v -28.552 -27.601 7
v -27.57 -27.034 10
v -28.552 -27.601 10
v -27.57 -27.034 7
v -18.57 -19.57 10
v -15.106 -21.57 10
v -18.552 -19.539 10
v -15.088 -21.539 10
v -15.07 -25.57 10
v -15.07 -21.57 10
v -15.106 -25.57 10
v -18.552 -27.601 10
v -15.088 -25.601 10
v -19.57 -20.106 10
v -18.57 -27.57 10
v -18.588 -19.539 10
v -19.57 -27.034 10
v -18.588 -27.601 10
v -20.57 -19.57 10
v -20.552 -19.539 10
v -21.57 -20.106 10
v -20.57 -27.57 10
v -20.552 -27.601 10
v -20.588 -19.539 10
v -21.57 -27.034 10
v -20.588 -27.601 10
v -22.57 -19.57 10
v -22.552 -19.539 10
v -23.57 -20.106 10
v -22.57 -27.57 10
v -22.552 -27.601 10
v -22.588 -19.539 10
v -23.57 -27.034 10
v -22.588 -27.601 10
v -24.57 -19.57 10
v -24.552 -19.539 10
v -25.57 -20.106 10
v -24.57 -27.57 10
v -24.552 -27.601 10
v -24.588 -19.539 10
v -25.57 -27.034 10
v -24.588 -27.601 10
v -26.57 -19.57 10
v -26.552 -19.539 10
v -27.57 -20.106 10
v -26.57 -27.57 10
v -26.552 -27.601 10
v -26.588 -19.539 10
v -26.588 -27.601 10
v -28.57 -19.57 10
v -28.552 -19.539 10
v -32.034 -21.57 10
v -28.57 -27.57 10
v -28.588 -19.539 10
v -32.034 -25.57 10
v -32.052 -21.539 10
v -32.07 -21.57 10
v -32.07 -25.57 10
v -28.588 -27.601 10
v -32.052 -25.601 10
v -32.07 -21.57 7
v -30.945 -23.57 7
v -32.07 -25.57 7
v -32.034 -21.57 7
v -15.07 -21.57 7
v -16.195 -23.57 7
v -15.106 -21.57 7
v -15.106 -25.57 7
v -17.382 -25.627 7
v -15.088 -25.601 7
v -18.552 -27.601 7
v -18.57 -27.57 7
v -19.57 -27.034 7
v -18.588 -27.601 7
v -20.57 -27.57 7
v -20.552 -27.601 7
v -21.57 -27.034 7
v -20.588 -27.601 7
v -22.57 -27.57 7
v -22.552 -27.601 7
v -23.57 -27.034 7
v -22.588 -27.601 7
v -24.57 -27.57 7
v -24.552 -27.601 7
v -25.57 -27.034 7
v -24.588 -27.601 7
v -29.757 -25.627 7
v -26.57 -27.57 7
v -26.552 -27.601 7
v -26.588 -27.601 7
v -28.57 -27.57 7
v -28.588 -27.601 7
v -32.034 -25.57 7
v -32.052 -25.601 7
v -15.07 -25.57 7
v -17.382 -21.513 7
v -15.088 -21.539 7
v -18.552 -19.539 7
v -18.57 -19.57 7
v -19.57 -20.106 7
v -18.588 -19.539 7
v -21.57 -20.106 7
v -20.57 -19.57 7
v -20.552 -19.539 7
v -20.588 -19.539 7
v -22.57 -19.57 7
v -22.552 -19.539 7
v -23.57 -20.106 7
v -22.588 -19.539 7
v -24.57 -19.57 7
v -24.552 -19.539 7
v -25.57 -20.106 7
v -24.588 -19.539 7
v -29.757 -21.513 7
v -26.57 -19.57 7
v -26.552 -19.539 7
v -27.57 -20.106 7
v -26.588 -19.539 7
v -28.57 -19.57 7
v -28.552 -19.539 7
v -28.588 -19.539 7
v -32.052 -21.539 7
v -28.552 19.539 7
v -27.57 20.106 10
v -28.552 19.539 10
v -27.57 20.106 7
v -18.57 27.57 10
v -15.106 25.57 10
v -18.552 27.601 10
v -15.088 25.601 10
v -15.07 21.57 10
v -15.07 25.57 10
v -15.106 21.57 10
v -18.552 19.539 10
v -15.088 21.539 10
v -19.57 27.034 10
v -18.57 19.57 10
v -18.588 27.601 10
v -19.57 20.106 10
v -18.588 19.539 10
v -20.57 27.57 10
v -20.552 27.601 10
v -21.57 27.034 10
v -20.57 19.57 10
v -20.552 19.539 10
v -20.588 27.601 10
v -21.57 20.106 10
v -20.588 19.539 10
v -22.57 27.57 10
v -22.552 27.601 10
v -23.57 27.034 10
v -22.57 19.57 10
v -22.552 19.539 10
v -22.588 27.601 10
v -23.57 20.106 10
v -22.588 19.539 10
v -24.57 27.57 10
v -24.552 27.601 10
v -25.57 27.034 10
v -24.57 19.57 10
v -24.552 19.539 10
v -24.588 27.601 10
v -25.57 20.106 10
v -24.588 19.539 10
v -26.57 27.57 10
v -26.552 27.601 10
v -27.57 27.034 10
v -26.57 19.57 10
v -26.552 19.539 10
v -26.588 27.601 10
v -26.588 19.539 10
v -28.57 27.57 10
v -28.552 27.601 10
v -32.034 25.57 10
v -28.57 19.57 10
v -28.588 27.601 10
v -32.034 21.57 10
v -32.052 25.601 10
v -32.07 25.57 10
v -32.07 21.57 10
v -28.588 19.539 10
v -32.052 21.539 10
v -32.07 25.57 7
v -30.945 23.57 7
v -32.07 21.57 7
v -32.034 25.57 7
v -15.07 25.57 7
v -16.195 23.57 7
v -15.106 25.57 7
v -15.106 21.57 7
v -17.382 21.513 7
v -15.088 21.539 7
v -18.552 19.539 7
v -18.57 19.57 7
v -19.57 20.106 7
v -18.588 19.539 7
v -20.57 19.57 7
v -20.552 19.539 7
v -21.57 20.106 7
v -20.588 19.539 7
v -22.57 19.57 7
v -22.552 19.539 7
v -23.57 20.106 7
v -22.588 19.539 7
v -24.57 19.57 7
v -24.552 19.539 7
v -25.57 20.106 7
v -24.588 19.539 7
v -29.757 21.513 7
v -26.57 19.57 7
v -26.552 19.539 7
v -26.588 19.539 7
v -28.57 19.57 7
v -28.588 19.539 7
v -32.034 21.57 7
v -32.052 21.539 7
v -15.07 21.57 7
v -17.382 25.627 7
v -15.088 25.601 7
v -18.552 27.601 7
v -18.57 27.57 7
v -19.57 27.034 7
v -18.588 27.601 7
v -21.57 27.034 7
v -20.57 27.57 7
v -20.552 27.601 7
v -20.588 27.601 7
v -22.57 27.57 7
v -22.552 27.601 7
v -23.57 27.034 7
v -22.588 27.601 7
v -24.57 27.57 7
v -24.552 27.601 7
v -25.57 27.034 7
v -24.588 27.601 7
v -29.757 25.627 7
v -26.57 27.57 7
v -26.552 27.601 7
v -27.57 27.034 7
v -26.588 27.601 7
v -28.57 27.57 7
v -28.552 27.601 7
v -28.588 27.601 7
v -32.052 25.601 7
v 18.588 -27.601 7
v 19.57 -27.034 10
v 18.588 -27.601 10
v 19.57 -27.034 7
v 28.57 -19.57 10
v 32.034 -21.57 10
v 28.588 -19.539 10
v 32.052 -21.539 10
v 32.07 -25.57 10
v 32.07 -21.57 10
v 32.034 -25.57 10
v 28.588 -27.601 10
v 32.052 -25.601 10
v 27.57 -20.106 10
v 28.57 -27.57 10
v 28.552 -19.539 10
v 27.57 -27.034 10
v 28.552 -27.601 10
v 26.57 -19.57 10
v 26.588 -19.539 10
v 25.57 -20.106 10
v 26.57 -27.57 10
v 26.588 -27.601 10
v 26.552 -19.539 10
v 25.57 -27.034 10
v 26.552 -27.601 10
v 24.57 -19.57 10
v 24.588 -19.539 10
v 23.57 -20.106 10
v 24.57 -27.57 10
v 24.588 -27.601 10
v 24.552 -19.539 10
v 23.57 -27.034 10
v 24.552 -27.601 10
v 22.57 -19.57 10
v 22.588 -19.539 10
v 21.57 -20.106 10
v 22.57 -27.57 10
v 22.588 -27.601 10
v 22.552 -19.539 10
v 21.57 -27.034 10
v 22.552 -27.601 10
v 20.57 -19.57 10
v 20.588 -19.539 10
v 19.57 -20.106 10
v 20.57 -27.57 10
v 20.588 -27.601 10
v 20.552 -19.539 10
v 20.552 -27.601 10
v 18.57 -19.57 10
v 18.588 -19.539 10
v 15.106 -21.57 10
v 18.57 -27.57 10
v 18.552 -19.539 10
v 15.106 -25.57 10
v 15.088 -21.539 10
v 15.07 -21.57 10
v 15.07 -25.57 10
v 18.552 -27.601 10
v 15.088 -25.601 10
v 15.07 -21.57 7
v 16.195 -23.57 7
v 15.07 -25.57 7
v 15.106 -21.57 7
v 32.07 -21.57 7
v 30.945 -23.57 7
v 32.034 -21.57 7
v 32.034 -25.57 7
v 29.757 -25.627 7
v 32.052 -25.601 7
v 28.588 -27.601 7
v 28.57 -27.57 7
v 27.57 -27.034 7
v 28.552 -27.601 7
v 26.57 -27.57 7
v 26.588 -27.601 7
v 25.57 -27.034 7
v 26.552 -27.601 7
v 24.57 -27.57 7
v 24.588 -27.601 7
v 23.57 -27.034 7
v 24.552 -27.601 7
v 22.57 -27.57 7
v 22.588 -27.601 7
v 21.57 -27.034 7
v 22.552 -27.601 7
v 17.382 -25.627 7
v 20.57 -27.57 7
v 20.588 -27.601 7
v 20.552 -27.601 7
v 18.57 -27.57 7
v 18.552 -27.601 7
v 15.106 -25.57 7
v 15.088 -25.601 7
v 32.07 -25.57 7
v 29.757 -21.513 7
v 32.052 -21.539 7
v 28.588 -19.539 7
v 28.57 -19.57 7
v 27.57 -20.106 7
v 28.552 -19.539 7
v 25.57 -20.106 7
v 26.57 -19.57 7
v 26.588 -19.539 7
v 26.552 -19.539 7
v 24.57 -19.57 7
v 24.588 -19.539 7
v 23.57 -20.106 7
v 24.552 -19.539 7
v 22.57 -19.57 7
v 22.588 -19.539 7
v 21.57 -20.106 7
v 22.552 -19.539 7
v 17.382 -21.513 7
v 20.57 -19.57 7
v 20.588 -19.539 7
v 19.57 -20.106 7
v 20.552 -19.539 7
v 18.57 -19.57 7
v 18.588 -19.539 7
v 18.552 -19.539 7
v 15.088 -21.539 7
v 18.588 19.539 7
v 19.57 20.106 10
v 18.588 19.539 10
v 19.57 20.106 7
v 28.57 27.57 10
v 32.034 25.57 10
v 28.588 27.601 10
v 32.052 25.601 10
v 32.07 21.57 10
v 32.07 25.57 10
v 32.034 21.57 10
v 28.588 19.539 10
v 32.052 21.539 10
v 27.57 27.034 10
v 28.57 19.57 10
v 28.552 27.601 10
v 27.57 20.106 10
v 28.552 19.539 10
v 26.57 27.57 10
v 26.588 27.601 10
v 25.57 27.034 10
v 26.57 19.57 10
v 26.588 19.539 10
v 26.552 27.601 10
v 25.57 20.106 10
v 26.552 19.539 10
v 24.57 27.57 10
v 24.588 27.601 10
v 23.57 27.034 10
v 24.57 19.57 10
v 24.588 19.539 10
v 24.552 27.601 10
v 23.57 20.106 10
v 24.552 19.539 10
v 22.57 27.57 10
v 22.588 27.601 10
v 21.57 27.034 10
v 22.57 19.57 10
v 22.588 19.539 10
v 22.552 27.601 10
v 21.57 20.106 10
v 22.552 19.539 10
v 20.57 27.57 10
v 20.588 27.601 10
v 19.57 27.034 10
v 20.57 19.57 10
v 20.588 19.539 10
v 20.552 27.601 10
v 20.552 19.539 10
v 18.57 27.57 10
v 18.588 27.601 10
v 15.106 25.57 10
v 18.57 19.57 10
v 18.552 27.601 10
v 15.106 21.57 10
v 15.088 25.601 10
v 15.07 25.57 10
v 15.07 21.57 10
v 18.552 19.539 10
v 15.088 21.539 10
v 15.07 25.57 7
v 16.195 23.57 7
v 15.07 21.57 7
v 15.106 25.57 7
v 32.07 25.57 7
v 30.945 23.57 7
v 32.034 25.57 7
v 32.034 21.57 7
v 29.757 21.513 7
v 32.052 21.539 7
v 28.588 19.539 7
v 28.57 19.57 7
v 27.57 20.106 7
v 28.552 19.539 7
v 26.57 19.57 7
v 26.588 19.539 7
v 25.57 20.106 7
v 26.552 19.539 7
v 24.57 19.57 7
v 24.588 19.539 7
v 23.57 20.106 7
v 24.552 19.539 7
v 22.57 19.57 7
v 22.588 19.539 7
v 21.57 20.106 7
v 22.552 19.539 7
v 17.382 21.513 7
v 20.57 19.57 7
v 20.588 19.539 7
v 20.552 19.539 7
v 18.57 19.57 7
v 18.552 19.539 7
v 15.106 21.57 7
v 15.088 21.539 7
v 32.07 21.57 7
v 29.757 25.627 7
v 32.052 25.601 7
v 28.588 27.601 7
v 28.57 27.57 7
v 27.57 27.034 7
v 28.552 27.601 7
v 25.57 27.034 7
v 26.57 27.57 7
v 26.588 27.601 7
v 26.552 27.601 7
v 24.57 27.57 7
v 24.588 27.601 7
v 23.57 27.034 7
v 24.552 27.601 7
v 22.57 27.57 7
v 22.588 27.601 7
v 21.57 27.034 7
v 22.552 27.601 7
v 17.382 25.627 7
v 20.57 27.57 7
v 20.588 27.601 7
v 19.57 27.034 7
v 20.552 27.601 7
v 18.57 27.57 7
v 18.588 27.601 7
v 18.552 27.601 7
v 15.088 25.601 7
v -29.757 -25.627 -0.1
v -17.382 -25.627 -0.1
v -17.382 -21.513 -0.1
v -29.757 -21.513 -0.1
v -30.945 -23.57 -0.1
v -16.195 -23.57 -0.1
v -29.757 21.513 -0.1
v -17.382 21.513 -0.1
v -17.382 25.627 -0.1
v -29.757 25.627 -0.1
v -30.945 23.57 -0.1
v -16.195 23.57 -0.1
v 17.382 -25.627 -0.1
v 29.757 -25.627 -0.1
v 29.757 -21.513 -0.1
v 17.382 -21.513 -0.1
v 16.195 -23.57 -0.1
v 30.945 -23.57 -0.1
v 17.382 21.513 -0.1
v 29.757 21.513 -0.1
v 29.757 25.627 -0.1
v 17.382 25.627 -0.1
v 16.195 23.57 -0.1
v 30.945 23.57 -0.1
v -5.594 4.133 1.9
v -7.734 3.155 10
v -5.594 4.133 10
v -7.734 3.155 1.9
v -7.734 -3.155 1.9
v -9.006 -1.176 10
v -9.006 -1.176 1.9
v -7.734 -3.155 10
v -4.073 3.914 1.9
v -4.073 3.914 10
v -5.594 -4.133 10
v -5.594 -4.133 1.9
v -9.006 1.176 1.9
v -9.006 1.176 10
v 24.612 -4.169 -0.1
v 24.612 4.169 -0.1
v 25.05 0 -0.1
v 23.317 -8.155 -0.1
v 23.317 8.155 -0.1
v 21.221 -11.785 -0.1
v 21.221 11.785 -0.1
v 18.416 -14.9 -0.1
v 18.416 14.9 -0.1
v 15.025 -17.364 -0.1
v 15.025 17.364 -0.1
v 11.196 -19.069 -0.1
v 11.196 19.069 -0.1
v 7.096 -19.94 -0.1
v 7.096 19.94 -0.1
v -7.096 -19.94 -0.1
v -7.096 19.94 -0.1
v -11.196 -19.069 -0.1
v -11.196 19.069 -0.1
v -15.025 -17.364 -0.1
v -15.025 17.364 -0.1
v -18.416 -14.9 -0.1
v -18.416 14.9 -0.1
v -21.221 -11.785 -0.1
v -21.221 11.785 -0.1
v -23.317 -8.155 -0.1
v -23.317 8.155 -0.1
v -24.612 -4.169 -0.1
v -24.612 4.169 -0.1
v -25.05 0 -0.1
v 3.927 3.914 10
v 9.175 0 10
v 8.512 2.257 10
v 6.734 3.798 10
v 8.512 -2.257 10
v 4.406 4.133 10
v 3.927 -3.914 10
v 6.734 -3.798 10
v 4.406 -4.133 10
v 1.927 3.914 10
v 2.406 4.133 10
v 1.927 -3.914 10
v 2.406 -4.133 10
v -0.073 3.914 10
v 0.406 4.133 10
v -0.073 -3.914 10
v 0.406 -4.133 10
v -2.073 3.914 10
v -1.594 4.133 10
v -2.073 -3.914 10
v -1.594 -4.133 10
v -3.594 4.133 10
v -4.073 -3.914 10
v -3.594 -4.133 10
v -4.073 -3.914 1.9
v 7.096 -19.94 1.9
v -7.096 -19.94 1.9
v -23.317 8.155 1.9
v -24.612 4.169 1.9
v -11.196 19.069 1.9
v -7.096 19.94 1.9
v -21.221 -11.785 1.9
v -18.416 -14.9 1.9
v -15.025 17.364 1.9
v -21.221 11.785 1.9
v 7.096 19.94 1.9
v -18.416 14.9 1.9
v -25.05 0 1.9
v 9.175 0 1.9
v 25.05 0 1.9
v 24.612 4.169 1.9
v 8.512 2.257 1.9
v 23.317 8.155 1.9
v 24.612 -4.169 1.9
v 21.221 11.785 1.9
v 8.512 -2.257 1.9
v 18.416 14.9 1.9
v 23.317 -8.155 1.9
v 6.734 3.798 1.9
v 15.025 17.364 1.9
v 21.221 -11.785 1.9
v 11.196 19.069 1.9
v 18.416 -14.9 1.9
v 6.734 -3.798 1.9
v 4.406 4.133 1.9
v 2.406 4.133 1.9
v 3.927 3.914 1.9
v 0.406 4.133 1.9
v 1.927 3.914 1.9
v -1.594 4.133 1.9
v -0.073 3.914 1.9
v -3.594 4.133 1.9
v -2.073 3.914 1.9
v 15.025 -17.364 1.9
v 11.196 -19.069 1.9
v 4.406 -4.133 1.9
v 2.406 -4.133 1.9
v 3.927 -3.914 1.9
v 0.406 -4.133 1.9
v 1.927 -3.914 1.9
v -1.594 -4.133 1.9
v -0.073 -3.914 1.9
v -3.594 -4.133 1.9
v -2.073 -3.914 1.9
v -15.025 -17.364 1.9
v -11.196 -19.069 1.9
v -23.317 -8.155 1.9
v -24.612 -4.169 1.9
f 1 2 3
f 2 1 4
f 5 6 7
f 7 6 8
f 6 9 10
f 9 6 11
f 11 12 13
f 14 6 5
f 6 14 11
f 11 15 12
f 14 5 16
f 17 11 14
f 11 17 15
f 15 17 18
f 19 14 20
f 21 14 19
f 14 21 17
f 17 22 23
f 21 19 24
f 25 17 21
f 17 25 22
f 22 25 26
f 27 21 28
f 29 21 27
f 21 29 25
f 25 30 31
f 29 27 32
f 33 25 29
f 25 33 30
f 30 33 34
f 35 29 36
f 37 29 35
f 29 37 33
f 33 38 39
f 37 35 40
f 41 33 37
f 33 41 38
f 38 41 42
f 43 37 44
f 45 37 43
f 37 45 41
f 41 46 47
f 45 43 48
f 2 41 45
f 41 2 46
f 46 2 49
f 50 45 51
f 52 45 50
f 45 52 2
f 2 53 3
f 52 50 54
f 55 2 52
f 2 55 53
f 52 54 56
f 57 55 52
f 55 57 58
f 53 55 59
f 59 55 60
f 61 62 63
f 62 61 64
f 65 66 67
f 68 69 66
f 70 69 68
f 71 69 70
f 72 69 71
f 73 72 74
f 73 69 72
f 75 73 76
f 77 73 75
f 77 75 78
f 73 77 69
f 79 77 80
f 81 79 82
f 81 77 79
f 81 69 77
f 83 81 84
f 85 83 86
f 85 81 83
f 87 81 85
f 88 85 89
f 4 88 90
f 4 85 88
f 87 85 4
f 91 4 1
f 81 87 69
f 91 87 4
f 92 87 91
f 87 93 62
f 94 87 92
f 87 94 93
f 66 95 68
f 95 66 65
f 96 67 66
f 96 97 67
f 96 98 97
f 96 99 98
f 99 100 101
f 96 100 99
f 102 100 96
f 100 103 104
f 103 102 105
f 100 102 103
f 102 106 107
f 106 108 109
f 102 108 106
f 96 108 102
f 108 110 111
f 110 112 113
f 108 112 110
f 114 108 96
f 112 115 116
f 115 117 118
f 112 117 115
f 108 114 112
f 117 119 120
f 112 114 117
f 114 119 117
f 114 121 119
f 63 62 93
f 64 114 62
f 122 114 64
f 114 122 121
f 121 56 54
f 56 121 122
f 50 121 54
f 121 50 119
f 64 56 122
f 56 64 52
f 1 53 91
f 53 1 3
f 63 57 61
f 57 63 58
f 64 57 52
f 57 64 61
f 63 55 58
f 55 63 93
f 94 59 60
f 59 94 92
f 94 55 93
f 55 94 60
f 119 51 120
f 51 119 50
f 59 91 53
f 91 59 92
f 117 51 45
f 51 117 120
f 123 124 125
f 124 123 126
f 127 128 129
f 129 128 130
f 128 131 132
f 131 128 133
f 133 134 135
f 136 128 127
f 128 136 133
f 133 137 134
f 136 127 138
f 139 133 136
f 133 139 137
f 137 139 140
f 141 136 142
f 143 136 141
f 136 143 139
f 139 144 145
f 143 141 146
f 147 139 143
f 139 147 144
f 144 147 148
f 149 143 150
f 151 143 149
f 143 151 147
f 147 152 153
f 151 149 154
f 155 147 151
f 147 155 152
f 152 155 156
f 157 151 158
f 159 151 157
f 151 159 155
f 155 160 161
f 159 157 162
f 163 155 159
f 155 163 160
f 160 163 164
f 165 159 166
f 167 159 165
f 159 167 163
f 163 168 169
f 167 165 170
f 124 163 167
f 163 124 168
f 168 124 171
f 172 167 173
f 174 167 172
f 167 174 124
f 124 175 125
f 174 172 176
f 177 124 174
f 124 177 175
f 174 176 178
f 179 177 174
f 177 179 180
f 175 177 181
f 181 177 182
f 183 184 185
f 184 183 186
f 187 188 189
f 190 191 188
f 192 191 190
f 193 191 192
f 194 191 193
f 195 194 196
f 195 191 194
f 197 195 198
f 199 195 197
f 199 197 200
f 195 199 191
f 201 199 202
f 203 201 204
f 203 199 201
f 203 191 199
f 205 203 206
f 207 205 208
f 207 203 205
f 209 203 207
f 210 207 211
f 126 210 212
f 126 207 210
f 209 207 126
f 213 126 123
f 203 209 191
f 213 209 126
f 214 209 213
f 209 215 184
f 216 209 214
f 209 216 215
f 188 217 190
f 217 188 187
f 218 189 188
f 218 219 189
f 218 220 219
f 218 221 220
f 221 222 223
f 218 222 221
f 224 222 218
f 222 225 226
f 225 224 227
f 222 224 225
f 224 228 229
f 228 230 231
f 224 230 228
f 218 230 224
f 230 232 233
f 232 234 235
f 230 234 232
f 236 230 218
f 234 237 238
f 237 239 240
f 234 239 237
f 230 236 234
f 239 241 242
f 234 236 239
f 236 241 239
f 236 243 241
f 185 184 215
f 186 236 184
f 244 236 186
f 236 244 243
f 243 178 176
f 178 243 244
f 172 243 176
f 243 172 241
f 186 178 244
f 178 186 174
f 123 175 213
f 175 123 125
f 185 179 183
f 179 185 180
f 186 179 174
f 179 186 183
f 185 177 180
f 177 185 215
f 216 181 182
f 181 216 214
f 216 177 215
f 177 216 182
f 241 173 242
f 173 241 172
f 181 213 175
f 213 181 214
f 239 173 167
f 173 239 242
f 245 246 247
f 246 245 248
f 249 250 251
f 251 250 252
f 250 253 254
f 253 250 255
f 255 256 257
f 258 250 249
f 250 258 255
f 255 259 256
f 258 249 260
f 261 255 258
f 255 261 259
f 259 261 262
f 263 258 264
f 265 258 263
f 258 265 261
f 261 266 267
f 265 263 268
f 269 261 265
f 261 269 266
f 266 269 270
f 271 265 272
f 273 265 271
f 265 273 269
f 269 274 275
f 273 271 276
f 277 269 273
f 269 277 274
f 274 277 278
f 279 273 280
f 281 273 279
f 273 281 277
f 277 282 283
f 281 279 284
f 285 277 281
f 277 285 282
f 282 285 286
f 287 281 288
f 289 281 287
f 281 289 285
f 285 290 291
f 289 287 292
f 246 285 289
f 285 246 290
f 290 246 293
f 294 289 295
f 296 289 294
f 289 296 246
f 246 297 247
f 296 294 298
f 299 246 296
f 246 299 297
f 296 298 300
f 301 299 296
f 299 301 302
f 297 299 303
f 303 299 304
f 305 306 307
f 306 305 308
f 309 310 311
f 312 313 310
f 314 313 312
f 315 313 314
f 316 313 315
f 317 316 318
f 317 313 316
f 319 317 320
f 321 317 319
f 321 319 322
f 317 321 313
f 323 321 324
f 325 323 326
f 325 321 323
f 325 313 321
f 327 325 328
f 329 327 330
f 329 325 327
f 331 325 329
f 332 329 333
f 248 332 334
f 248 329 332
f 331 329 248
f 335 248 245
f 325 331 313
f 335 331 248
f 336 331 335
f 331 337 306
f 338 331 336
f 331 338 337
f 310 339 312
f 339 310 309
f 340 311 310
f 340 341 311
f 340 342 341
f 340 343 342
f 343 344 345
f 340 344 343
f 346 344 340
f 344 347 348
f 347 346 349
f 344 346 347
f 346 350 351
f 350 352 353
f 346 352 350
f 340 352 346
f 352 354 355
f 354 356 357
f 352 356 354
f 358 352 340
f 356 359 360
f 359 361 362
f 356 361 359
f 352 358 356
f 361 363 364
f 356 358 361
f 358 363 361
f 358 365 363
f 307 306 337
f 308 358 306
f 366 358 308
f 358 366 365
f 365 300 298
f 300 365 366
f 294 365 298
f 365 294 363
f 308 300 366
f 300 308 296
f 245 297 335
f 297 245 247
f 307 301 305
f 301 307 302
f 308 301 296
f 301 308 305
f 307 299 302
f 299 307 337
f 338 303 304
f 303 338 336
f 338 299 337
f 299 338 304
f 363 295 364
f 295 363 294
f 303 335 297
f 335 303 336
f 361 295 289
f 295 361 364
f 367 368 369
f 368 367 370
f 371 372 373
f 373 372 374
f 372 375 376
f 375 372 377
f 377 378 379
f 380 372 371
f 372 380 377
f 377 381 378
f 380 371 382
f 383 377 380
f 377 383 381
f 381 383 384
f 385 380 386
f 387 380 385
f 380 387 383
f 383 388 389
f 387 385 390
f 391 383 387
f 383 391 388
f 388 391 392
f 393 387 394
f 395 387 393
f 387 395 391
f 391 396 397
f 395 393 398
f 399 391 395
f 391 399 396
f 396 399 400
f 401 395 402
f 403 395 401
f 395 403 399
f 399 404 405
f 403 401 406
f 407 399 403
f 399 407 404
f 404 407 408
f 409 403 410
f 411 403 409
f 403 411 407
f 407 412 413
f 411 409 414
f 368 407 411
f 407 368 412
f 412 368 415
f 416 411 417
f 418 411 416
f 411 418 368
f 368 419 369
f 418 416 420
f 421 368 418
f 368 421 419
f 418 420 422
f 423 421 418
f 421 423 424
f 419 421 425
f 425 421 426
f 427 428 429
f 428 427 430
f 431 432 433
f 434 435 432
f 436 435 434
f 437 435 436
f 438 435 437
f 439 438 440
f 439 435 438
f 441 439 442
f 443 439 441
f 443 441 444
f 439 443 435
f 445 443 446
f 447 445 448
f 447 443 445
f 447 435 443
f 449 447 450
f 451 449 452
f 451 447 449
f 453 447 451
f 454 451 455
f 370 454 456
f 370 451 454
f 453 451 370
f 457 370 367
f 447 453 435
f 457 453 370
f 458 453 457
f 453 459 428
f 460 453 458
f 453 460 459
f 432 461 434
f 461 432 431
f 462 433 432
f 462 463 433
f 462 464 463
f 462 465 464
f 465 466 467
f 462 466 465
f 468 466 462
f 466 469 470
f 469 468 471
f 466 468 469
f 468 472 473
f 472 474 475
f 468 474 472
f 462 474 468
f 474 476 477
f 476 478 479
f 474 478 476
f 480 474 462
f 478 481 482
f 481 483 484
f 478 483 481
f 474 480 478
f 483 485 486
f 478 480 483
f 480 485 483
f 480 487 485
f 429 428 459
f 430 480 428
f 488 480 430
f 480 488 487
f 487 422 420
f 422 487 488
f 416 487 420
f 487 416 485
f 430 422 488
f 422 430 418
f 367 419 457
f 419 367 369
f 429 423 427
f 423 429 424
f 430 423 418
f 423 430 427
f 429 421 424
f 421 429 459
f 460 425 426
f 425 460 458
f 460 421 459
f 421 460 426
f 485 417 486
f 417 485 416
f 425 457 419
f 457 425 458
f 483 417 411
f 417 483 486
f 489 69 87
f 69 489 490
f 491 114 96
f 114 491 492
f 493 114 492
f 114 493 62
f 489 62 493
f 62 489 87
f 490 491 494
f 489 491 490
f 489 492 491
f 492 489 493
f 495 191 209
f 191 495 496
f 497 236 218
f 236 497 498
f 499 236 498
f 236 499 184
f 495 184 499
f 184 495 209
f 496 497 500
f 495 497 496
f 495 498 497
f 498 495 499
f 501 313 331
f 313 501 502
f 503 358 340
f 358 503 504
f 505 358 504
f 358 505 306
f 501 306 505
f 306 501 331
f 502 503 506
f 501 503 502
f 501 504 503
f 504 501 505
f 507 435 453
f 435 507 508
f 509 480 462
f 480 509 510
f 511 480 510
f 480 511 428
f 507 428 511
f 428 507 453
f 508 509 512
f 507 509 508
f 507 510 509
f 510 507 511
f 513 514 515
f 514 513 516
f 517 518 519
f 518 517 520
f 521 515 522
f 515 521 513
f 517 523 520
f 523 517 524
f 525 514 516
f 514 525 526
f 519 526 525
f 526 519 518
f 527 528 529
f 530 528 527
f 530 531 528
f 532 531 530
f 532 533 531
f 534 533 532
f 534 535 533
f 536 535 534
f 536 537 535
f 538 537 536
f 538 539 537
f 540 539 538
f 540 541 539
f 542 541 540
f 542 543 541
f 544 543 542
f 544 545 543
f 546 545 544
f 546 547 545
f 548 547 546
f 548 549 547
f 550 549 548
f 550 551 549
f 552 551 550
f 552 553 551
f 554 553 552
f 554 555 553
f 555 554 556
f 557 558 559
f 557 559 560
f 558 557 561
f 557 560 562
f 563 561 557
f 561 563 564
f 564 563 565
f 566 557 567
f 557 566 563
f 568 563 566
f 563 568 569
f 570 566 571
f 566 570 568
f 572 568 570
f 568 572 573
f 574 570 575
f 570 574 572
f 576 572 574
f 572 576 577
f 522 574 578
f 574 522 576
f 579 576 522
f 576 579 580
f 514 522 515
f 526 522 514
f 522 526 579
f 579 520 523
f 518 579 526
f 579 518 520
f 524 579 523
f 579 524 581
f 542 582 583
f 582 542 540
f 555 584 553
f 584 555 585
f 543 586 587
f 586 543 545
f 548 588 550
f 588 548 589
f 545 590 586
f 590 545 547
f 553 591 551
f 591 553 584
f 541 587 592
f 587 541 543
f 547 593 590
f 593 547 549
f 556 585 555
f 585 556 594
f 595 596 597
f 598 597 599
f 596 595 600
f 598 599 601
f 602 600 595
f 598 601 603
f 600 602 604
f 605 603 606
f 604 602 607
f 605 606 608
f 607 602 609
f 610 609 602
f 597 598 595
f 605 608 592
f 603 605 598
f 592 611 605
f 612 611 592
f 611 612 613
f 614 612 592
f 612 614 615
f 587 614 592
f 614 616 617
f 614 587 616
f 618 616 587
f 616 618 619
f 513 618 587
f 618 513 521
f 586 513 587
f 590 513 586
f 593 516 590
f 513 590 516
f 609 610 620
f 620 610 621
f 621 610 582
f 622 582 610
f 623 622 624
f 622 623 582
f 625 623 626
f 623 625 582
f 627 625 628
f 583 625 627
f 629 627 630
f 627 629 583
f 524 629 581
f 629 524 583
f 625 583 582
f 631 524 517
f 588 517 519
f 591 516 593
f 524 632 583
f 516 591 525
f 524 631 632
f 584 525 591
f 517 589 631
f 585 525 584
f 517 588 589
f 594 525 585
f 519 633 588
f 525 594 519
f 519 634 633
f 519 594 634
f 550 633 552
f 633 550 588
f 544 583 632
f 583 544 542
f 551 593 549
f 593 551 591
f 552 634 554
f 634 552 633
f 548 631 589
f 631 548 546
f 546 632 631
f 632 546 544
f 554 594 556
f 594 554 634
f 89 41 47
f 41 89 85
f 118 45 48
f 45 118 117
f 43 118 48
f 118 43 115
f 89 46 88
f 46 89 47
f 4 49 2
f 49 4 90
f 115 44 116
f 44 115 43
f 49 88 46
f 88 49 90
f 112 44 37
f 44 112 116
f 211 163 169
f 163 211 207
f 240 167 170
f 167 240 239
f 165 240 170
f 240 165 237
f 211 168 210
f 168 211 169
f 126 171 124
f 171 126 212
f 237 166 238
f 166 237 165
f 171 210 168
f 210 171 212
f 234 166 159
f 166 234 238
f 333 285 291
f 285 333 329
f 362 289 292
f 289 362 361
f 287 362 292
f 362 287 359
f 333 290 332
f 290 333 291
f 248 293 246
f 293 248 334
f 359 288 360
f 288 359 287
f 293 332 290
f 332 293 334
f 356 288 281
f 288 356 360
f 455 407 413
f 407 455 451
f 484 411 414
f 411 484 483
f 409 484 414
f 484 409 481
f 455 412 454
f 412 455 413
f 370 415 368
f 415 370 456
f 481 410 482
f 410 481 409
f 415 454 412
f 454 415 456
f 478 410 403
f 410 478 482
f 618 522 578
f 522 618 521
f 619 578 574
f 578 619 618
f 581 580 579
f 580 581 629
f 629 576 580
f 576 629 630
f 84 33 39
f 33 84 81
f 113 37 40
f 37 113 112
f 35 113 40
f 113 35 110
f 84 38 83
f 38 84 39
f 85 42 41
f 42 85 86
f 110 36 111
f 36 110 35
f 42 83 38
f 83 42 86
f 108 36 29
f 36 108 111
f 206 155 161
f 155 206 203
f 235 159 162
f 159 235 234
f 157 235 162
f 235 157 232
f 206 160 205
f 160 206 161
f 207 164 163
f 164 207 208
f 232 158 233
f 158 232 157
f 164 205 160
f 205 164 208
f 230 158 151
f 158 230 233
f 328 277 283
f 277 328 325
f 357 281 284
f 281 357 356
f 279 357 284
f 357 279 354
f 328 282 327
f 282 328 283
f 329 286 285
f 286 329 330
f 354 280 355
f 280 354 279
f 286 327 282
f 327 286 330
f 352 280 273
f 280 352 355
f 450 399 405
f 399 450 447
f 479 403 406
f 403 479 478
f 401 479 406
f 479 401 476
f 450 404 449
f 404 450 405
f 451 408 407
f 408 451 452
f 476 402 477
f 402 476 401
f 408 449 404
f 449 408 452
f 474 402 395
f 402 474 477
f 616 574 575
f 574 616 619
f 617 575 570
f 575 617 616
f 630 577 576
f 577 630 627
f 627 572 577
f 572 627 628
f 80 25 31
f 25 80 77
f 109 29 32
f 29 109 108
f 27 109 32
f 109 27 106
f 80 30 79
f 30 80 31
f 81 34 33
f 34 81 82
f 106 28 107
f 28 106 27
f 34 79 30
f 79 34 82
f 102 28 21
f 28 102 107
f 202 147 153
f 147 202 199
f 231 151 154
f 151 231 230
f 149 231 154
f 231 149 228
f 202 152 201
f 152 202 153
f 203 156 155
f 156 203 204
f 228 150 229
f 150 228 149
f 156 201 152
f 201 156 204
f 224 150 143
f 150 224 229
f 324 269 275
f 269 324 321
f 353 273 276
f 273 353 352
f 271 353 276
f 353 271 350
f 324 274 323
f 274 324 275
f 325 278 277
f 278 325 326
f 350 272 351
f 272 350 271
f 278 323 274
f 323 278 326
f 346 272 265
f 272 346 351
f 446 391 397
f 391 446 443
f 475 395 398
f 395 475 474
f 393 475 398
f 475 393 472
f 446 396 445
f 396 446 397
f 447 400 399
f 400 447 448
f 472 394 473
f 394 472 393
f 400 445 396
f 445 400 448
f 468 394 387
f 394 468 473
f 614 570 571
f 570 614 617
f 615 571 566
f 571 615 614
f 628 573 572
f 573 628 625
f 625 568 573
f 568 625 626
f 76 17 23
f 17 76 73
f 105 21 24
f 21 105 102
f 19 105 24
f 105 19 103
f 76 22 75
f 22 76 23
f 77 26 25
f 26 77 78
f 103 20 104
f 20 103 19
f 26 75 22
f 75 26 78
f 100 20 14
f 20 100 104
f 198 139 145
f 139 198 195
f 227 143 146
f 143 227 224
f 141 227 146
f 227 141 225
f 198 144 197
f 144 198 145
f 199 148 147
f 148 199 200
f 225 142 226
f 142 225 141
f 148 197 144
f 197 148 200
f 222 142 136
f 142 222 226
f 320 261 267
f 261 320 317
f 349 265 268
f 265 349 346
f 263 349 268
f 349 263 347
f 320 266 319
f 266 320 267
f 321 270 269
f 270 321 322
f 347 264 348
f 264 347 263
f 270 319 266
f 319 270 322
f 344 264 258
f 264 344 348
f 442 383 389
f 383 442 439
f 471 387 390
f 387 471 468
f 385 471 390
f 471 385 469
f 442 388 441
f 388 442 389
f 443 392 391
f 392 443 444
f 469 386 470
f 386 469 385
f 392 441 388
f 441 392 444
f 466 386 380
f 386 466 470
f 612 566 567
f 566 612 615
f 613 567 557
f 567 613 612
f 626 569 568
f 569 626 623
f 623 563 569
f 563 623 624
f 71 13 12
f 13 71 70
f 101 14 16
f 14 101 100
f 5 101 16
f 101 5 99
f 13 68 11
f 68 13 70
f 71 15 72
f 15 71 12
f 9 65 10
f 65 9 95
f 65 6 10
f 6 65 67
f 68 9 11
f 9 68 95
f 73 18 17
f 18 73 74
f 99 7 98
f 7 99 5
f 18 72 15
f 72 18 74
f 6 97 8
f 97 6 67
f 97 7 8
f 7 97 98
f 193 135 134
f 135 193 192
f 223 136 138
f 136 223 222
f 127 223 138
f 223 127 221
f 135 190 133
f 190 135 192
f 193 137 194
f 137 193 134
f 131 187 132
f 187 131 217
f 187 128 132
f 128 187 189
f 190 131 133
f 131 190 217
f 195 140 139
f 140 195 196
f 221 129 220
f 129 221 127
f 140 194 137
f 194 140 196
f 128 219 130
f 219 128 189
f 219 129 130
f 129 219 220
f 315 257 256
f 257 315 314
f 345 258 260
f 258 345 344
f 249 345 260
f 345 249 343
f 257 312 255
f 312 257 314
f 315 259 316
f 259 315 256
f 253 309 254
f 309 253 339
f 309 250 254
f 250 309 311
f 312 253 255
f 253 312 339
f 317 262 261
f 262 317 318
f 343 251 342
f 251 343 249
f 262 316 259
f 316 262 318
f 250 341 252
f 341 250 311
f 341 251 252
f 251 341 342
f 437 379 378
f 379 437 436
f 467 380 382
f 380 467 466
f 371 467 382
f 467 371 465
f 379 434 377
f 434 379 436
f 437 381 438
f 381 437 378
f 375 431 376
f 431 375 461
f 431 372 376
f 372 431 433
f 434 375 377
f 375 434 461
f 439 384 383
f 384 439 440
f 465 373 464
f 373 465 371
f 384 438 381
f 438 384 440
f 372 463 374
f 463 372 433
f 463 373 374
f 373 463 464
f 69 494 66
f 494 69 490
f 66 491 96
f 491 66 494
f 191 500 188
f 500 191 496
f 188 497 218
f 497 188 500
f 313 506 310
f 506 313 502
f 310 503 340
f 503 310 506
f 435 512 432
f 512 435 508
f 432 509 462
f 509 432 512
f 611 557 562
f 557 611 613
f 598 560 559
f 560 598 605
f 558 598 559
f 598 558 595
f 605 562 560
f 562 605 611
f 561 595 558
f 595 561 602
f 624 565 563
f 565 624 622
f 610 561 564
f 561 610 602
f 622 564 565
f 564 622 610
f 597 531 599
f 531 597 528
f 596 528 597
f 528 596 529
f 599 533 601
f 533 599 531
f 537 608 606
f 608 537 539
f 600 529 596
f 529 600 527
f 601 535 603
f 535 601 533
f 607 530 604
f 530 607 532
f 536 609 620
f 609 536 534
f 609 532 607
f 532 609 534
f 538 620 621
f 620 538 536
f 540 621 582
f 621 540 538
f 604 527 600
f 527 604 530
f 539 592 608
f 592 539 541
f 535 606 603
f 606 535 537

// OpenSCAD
/**
 * NEMAMount.scad
 *
 * Produces the shape to be subtracted from a base to make a NEMA motor mount.
 *
 * @copyright  James Newton, 2013
 * @license    http://creativecommons.org/licenses/LGPL/2.1/
 * @license    http://creativecommons.org/licenses/by-sa/3.0/
 *
 * @see        http://www.thingiverse.com/thing:137829
 *
 *
**/


/* ******************************************************************************
 * Customizer parameters and rendering
 * ****************************************************************************** */

/* [Global] */


//The NEMA size. See: massmind.org/techref/io/stepper/nemasizes.htm
NEMA_Size = 23; // [8,11,14,17,23,34,42]

//Drive Shaft clearance hole: 0=no shaft, positive # = that size, negative number = standard NEMA shaft + abs(shaft) e.g. NEMA_Mount(17,shaft=-1) gives a 5+1=6mm shaft hole.
shaft = -1; // [-50:50]

//Pilot mounting indentation diameter: 0=no indentation, positive # = that diameter, negative # = standard NEMA pilot + abs(pilot)
pilot = -1; // [-20:90]

//height of the mounting and shaft holes. e.g. the thickness of your mounting plate
height = 10; // [1:100]

//Size of nut head. 0 for no nuts or an M size.
nut_size = 4; // [0:20]

//height of the nut head. 0 for no nuts or an M height.
nut_height =3; // [0:20]

//Distance the motor can slide in the mount.
adjust = 5; // [0:10]

//Show sample base with NEMA mount subtracted.
Show_Base =  0; // [0,1]

/* [Hidden] */


difference() {
	if (Show_Base==1)
		translate([-NEMA_Size*2,-NEMA_Size*2,0]) cube([NEMA_Size*4,NEMA_Size*4,height-.01]);
	NEMA_Mount (NEMA_Size, shaft, pilot, height, nut_size, nut_height, adjust);
	}


module NEMA_Mount (NEMA_Size, shaft=-1, pilot=-1, height, nut_size, nut_height, adjust=0) {
	for (r = [-adjust: 2: adjust]) 
		translate([r,0,0])
		Simple_NEMA_Mount (NEMA_Size, shaft, pilot, height, nut_size, nut_height, $fs=adjust/2+0.01);
	//drop the resolution to keep from swamping the system with CSG Products.
	}

module Simple_NEMA_Mount (NEMA_Size, shaft=-1, pilot=-1, height, nut_size, nut_height) {

	NEMA_Mount = lookup(NEMA_Size,[
		[ 8,15.4/2],
		[11,23.0/2],
		[14,26.0/2],
		[17,31.04/2],
		[23,47.14/2],
		[34,69.58/2],
		[42,88.90/2]
		]);

	NEMA_Bolt = lookup(NEMA_Size,[
		[ 8,2.0/2],
		[11,2.5/2],
		[14,3.0/2],
		[17,4.0/2],
		[23,4.75/2],
		[34,6.5/2],
		[42,7.15/2]
		]);

//the -.1's here are to ensure the hole breaks through the mounting plate
	translate([-NEMA_Mount,-NEMA_Mount,-.1]) cylinder(h=height-nut_height+.2, r=NEMA_Bolt);
	if (nut_height > 0) translate([-NEMA_Mount,-NEMA_Mount,height-nut_height]) nut(nut_size, nut_height);
	translate([-NEMA_Mount,+NEMA_Mount,-.1]) cylinder(h=height-nut_height+.2, r=NEMA_Bolt);
	if (nut_height > 0) translate([-NEMA_Mount,+NEMA_Mount,height-nut_height]) nut(nut_size, nut_height);
	translate([+NEMA_Mount,-NEMA_Mount,-.1]) cylinder(h=height-nut_height+.2, r=NEMA_Bolt);
	if (nut_height > 0) translate([+NEMA_Mount,-NEMA_Mount,height-nut_height]) nut(nut_size, nut_height);
	translate([+NEMA_Mount,+NEMA_Mount,-.1]) cylinder(h=height-nut_height+.2, r=NEMA_Bolt);
	if (nut_height > 0) translate([+NEMA_Mount,+NEMA_Mount,height-nut_height]) nut(nut_size, nut_height);
	if (shaft > 0) translate([0,0,-.1]) cylinder(h=height+.1, r=shaft);
	if (shaft < 0) translate([0,0,-.1]) cylinder(h=height+.1, r=-shaft + lookup(NEMA_Size,[
		[ 8,4.00/2],
		[11,5.00/2],
		[14,5.00/2],
		[17,5.00/2],
		[23,6.35/2],
		[34,9.50/2],
		[42,16.0/2]
		])
		);
	if (pilot > 0) cylinder(h=2, r=pilot);
	if (pilot < 0) translate([0,0,-.1]) cylinder(h=2, r=-pilot + lookup(NEMA_Size,[
		[ 8,15.00/2],
		[11,22.00/2],
		[14,22.00/2],
		[17,22.00/2],
		[23,38.10/2],
		[34,73.00/2],
		[42,73.0/2]
		])
		);
	};

module nut(nutSize,nutHeight) {
	//I have no idea if this actually produces the correct size.
	// need to check against:
	//http://www.boltdepot.com/fastener-information/Nuts-Washers/Metric-Nut-Dimensions.aspx
	for (r = [-60, 0, 60]) 
		translate([0,0,nutHeight/2]) rotate([0,0,r]) cube([nutSize*1.75, nutSize, nutHeight], true);
	}

